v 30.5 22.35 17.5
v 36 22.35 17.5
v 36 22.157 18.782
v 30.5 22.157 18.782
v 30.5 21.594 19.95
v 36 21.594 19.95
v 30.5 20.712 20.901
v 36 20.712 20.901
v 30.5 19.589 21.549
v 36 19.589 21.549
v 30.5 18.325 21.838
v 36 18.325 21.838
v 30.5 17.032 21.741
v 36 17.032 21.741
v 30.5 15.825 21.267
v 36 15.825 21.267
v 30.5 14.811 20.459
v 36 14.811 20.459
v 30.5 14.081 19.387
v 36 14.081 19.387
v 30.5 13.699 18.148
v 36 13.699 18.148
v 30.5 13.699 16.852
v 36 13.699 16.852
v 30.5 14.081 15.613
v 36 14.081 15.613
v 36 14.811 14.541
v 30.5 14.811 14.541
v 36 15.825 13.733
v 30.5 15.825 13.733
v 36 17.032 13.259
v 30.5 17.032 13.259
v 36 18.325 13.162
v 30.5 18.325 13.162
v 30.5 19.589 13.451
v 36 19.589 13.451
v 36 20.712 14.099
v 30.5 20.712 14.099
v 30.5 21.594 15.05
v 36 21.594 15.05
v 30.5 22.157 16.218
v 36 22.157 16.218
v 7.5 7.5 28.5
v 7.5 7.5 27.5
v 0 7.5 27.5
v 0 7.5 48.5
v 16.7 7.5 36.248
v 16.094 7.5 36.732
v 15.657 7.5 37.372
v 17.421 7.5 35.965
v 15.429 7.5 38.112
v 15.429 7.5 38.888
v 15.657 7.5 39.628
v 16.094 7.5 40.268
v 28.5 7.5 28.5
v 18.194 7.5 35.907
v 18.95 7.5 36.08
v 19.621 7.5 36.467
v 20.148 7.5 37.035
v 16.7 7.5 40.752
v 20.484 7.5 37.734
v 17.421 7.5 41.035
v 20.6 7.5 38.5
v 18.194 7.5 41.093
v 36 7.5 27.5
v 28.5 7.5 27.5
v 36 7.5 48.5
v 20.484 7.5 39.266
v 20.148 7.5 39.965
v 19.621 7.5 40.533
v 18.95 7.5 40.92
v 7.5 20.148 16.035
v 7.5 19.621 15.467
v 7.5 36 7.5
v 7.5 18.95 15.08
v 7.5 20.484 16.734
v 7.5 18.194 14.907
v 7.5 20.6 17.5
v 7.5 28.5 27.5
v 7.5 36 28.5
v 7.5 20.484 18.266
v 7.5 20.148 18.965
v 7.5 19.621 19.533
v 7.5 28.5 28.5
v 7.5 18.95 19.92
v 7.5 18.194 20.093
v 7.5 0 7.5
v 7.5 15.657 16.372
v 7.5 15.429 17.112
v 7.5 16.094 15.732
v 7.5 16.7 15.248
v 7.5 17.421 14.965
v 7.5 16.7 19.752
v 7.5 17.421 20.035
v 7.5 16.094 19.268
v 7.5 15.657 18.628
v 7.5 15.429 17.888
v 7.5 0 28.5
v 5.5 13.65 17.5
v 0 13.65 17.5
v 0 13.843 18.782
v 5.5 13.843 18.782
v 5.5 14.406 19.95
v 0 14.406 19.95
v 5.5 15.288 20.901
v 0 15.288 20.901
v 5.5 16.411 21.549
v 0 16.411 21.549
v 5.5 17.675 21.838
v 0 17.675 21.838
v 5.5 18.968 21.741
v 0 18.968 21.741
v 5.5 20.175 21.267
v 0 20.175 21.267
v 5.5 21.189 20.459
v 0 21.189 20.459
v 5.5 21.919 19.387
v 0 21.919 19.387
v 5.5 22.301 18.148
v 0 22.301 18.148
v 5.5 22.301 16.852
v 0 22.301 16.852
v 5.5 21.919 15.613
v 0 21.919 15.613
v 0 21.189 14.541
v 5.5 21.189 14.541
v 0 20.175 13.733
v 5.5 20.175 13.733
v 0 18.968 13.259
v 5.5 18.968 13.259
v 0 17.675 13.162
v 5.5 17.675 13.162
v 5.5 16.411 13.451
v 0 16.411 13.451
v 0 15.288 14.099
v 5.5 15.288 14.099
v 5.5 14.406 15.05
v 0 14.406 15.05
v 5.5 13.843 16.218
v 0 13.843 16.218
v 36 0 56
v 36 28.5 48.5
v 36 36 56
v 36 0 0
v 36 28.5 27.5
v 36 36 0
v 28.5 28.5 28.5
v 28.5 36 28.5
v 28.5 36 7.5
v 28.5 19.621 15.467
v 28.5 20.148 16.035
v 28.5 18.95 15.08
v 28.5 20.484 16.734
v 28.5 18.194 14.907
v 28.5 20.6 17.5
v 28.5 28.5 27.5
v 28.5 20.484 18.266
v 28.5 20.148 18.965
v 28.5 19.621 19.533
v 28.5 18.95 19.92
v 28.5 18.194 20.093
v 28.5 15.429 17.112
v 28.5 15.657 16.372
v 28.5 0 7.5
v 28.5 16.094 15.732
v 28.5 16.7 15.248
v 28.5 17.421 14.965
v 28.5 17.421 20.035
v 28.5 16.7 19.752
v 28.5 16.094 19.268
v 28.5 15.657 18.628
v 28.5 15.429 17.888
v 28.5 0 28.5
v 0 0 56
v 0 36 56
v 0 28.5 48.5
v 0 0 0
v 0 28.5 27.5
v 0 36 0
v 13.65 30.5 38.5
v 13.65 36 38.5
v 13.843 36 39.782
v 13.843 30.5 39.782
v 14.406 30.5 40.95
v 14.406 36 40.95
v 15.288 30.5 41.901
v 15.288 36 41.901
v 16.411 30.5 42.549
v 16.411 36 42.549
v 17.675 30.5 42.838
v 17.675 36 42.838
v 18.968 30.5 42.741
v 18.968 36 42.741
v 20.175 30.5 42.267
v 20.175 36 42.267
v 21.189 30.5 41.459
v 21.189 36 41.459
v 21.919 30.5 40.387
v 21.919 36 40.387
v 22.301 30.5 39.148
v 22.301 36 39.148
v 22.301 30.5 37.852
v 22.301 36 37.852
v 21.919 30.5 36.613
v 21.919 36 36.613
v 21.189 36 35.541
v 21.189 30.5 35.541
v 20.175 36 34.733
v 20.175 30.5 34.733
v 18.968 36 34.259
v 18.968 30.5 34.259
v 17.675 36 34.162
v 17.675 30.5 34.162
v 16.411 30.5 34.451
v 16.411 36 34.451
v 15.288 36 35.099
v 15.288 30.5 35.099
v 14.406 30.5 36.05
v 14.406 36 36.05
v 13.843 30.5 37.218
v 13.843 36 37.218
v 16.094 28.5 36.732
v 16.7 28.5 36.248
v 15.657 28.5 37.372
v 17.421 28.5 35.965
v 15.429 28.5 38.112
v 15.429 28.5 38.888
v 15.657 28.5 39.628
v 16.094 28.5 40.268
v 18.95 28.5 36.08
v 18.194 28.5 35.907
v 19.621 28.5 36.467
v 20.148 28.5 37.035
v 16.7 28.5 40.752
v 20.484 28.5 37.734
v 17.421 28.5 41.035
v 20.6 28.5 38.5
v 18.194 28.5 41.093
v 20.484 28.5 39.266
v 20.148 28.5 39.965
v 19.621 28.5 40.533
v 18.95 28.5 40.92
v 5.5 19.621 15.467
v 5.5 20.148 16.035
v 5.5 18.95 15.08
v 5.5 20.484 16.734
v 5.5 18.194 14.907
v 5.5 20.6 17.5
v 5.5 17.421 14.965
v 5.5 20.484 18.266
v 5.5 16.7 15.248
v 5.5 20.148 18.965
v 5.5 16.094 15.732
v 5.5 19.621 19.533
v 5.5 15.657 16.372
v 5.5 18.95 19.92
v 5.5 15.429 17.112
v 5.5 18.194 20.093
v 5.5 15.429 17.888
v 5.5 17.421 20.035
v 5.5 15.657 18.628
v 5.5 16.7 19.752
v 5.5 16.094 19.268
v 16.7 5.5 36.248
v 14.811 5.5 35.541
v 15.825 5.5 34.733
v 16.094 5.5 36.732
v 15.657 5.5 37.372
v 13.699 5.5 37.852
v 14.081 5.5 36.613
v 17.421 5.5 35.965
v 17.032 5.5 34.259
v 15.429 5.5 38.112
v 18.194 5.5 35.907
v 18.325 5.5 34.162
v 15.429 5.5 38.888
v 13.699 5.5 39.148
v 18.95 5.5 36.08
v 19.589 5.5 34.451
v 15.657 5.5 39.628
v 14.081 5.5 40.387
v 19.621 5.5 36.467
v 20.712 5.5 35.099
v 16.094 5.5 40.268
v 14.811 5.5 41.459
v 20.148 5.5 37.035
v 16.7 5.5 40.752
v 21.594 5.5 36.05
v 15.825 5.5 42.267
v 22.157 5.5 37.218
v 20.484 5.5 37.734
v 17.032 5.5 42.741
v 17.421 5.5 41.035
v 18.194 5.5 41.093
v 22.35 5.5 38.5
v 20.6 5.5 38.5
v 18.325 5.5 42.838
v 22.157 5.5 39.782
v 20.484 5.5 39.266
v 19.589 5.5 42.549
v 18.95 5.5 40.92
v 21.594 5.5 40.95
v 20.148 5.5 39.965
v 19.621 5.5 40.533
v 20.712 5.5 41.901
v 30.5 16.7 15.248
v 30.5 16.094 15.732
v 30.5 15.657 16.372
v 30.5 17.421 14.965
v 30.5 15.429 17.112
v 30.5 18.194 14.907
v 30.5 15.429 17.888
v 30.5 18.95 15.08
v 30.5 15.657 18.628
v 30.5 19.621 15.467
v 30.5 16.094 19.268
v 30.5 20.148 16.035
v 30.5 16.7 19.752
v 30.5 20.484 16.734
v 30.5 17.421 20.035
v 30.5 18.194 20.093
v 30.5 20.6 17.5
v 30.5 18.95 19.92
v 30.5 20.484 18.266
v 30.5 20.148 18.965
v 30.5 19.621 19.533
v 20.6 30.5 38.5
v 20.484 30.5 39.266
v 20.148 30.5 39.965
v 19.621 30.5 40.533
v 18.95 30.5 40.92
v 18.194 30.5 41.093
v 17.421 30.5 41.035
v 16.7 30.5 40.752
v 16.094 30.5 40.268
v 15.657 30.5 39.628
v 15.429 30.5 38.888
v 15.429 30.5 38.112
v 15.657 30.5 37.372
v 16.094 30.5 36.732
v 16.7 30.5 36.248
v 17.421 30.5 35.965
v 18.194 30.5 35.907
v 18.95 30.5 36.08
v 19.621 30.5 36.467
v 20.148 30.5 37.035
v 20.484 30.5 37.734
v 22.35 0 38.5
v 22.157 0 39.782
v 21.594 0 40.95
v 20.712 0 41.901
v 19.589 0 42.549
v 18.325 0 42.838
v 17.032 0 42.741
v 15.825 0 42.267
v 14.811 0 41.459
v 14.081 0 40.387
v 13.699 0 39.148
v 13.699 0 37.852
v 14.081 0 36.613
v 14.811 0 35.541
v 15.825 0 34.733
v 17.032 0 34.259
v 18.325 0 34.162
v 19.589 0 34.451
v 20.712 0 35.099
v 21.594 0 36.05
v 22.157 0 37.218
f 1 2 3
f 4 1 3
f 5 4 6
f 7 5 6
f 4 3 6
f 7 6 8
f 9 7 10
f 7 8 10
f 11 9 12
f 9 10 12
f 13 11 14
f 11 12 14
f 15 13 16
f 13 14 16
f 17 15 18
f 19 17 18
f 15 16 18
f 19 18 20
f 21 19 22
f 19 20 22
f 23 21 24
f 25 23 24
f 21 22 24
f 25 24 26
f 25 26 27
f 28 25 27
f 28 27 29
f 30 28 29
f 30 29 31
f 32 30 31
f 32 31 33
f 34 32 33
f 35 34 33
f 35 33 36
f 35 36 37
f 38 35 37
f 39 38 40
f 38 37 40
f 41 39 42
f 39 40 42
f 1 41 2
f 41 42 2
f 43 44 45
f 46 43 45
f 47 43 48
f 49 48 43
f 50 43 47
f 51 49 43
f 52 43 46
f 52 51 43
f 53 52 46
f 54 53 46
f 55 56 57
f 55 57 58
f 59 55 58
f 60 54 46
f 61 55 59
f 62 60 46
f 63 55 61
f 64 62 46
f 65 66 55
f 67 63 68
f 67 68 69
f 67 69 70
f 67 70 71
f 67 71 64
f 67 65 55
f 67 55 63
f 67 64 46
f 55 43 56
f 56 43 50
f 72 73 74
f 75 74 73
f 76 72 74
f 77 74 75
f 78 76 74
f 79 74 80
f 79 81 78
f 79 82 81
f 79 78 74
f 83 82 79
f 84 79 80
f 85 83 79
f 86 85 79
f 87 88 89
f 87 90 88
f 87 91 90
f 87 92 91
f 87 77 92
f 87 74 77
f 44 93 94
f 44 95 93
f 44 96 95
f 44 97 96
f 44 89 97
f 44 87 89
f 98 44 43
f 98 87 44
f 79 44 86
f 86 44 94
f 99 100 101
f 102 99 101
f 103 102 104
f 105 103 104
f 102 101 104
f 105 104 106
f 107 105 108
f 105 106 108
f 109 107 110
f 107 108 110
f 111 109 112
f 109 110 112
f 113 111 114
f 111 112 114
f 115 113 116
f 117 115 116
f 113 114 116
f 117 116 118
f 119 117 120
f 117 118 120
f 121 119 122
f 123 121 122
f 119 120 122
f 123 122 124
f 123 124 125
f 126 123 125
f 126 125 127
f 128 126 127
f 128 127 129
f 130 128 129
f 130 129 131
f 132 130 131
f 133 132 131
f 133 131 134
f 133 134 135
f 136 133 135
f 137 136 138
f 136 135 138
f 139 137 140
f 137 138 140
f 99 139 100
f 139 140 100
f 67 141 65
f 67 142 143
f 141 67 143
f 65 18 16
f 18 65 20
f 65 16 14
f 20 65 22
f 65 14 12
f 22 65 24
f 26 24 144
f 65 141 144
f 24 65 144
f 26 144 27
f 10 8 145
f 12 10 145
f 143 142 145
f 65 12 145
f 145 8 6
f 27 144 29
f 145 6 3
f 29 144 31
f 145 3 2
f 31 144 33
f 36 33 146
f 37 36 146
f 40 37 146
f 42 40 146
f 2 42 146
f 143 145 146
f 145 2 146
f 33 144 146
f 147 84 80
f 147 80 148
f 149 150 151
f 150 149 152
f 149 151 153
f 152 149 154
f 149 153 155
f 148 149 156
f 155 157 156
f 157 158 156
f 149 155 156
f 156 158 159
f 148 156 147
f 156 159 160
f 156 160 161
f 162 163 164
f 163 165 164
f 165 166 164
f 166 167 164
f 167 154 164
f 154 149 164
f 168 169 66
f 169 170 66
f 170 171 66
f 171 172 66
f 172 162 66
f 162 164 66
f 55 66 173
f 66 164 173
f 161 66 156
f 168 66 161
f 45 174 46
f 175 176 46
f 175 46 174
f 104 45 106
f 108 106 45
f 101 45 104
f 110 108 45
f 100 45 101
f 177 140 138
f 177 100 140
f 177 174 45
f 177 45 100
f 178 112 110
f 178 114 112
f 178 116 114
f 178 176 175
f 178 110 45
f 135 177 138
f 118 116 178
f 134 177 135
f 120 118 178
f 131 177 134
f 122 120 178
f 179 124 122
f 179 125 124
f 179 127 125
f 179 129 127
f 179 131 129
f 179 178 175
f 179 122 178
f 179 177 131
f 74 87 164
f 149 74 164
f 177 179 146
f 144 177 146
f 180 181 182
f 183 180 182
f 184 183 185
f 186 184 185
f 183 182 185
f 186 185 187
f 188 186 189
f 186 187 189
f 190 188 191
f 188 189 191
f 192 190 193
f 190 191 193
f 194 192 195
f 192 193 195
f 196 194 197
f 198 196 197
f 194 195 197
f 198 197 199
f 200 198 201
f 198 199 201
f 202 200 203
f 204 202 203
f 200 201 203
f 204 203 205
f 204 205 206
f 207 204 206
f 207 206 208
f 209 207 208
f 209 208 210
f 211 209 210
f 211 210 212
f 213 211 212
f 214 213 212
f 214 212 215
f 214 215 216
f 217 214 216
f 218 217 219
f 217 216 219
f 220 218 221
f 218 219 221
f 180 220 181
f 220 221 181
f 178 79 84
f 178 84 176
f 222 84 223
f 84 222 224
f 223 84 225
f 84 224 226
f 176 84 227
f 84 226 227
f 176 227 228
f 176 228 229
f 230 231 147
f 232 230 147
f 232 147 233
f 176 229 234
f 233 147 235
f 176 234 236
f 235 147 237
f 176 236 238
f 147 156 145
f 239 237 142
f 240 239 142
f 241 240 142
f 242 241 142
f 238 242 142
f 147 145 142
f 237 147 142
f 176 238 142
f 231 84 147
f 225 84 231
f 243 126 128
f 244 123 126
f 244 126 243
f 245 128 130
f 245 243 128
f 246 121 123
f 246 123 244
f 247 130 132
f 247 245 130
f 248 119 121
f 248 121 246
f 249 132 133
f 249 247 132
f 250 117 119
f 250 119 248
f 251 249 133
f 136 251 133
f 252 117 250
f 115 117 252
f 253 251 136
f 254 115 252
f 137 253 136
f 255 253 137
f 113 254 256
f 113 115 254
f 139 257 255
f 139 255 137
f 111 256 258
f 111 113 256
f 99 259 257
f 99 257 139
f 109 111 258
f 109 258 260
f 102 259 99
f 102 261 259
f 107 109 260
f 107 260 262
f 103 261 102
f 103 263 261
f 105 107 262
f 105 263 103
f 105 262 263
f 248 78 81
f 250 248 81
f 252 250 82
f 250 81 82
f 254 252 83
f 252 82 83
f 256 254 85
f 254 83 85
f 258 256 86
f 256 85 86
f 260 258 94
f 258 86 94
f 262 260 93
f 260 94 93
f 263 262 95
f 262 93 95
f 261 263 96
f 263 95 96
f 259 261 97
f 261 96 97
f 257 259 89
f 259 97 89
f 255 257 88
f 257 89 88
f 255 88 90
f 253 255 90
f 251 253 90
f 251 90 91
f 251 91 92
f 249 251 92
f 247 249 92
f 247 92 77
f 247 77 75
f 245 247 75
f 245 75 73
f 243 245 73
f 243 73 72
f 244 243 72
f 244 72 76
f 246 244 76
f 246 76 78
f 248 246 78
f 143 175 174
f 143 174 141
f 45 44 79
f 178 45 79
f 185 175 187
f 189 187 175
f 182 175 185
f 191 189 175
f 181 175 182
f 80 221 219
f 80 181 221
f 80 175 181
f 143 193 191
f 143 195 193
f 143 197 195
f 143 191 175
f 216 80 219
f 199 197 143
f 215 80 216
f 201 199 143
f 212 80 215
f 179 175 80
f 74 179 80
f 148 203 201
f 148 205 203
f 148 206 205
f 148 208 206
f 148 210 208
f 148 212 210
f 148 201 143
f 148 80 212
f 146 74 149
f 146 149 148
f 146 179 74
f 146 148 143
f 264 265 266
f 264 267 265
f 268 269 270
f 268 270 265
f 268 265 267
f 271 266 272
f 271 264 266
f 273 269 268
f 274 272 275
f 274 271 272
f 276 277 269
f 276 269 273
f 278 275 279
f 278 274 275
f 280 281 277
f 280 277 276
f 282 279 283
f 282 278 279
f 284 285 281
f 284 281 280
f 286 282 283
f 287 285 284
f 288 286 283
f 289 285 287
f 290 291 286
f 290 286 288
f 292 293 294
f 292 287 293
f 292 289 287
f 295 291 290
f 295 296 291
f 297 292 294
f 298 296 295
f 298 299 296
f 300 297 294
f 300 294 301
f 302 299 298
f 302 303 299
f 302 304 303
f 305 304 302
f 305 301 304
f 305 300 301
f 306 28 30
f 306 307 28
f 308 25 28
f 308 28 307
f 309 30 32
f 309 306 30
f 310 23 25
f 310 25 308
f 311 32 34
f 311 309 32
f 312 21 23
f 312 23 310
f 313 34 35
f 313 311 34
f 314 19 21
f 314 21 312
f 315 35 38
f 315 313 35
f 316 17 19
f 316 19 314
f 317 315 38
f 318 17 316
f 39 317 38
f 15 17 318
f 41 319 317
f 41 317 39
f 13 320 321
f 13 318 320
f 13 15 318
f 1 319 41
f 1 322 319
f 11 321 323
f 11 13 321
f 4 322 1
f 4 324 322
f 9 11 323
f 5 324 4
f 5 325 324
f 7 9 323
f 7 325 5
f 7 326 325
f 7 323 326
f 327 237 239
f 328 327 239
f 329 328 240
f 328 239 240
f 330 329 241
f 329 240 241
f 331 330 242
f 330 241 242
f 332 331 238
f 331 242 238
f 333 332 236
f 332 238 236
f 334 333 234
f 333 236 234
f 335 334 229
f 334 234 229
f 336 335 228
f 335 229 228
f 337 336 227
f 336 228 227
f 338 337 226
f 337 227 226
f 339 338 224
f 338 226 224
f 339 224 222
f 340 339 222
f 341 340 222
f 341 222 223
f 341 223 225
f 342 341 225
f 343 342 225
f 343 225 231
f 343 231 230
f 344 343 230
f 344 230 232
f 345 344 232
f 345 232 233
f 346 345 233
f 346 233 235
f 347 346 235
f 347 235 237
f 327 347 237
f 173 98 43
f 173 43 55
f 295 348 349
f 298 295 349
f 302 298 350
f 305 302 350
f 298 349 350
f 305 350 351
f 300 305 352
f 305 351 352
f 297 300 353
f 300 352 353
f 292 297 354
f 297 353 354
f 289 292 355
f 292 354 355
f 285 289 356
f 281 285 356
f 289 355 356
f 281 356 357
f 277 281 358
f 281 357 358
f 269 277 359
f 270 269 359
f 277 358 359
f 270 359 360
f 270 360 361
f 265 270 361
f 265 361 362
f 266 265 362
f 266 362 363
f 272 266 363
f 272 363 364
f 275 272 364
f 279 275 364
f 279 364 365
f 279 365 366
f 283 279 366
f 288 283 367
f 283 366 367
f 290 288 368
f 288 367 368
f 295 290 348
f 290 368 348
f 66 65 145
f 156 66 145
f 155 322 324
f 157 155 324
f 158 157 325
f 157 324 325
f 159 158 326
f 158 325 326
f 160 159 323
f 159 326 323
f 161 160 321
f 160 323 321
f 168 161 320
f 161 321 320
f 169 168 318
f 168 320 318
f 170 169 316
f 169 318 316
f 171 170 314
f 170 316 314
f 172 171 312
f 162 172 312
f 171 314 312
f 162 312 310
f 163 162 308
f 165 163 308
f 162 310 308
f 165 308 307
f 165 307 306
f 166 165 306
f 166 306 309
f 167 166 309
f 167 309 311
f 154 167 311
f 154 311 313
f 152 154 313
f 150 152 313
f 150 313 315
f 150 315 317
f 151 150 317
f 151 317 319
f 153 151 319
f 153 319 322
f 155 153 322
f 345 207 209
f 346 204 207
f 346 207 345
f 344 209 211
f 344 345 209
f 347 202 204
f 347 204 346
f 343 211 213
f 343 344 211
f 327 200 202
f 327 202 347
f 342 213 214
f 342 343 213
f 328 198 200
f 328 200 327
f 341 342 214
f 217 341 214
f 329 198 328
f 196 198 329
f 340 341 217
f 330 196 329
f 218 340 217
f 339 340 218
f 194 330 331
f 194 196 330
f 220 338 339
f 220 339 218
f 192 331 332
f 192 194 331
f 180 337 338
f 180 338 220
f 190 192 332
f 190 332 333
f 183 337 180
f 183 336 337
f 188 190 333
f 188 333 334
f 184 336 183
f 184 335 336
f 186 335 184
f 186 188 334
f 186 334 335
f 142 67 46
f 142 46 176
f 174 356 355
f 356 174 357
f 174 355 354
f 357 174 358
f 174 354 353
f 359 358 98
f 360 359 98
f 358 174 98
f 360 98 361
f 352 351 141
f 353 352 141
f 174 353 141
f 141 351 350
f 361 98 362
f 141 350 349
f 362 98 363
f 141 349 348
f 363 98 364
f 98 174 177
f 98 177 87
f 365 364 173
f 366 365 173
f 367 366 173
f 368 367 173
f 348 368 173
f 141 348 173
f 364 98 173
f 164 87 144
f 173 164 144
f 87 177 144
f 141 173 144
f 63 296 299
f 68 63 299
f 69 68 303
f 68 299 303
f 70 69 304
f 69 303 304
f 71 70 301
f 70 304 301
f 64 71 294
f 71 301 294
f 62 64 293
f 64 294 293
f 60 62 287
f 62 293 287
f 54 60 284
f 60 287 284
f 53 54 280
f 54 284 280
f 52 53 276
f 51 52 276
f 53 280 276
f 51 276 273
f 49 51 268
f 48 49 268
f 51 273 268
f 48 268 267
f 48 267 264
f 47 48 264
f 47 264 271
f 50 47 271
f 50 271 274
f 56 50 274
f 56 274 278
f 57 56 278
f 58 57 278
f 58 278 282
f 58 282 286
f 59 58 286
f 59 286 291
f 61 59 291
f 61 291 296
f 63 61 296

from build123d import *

# Parameters (mm, degrees)
F0_W      = 36
F0_H      = 36
F1_DEPTH  = 56
F2_W      = 21
F2_H      = 21
F2_R      = 2.6
F3_DEPTH  = 50
F4_W      = 21
F4_H      = 21
F4_R      = 2.6
F5_DEPTH  = 50
F6_R      = 4.35
F7_DEPTH  = 5.5
F8_R      = 4.35
F9_DEPTH  = 5.5
F10_R     = 4.35
F11_DEPTH = 5.5
F12_R     = 4.35
F13_DEPTH = 5.5


with BuildPart() as f1:
    # F0 (on Top) → F1 (new body)
    with BuildSketch(Plane.XY):
        with Locations((18, 18)):
            Rectangle(F0_W, F0_H)
    extrude(amount=F1_DEPTH)

    # F2 (on face) → F3 (cut)
    with BuildSketch(Plane.XZ):
        with Locations((18, 18)):
            Rectangle(F2_W, F2_H)
        with Locations((18, 38.5)):
            Circle(F2_R)
    extrude(amount=-F3_DEPTH, mode=Mode.SUBTRACT)

    # F4 (on face) → F5 (cut)
    with BuildSketch(Plane.YZ.offset(36)):
        with Locations((18, 38)):
            Rectangle(F4_W, F4_H)
        with Locations((18, 17.5)):
            Circle(F4_R)
    extrude(amount=-F5_DEPTH, mode=Mode.SUBTRACT)

    # F6 (on face) → F7 (cut)
    with BuildSketch(Plane.YZ.offset(36)):
        with Locations((18, 17.5)):
            Circle(F6_R)
    extrude(amount=-F7_DEPTH, mode=Mode.SUBTRACT)

    # F8 (on face) → F9 (cut)
    with BuildSketch(Plane(origin=(0, 0, 0), x_dir=(0, -1, 0), z_dir=(-1, 0, 0))):
        with Locations((-18, 17.5)):
            Circle(F8_R)
    extrude(amount=-F9_DEPTH, mode=Mode.SUBTRACT)

    # F10 (on face) → F11 (cut)
    with BuildSketch(Plane(origin=(0, 36, 0), x_dir=(-1, 0, 0), z_dir=(0, 1, 0))):
        with Locations((-18, 38.5)):
            Circle(F10_R)
    extrude(amount=-F11_DEPTH, mode=Mode.SUBTRACT)

    # F12 (on face) → F13 (cut)
    with BuildSketch(Plane.XZ):
        with Locations((18, 38.5)):
            Circle(F12_R)
    extrude(amount=-F13_DEPTH, mode=Mode.SUBTRACT)


solid = f1.part
